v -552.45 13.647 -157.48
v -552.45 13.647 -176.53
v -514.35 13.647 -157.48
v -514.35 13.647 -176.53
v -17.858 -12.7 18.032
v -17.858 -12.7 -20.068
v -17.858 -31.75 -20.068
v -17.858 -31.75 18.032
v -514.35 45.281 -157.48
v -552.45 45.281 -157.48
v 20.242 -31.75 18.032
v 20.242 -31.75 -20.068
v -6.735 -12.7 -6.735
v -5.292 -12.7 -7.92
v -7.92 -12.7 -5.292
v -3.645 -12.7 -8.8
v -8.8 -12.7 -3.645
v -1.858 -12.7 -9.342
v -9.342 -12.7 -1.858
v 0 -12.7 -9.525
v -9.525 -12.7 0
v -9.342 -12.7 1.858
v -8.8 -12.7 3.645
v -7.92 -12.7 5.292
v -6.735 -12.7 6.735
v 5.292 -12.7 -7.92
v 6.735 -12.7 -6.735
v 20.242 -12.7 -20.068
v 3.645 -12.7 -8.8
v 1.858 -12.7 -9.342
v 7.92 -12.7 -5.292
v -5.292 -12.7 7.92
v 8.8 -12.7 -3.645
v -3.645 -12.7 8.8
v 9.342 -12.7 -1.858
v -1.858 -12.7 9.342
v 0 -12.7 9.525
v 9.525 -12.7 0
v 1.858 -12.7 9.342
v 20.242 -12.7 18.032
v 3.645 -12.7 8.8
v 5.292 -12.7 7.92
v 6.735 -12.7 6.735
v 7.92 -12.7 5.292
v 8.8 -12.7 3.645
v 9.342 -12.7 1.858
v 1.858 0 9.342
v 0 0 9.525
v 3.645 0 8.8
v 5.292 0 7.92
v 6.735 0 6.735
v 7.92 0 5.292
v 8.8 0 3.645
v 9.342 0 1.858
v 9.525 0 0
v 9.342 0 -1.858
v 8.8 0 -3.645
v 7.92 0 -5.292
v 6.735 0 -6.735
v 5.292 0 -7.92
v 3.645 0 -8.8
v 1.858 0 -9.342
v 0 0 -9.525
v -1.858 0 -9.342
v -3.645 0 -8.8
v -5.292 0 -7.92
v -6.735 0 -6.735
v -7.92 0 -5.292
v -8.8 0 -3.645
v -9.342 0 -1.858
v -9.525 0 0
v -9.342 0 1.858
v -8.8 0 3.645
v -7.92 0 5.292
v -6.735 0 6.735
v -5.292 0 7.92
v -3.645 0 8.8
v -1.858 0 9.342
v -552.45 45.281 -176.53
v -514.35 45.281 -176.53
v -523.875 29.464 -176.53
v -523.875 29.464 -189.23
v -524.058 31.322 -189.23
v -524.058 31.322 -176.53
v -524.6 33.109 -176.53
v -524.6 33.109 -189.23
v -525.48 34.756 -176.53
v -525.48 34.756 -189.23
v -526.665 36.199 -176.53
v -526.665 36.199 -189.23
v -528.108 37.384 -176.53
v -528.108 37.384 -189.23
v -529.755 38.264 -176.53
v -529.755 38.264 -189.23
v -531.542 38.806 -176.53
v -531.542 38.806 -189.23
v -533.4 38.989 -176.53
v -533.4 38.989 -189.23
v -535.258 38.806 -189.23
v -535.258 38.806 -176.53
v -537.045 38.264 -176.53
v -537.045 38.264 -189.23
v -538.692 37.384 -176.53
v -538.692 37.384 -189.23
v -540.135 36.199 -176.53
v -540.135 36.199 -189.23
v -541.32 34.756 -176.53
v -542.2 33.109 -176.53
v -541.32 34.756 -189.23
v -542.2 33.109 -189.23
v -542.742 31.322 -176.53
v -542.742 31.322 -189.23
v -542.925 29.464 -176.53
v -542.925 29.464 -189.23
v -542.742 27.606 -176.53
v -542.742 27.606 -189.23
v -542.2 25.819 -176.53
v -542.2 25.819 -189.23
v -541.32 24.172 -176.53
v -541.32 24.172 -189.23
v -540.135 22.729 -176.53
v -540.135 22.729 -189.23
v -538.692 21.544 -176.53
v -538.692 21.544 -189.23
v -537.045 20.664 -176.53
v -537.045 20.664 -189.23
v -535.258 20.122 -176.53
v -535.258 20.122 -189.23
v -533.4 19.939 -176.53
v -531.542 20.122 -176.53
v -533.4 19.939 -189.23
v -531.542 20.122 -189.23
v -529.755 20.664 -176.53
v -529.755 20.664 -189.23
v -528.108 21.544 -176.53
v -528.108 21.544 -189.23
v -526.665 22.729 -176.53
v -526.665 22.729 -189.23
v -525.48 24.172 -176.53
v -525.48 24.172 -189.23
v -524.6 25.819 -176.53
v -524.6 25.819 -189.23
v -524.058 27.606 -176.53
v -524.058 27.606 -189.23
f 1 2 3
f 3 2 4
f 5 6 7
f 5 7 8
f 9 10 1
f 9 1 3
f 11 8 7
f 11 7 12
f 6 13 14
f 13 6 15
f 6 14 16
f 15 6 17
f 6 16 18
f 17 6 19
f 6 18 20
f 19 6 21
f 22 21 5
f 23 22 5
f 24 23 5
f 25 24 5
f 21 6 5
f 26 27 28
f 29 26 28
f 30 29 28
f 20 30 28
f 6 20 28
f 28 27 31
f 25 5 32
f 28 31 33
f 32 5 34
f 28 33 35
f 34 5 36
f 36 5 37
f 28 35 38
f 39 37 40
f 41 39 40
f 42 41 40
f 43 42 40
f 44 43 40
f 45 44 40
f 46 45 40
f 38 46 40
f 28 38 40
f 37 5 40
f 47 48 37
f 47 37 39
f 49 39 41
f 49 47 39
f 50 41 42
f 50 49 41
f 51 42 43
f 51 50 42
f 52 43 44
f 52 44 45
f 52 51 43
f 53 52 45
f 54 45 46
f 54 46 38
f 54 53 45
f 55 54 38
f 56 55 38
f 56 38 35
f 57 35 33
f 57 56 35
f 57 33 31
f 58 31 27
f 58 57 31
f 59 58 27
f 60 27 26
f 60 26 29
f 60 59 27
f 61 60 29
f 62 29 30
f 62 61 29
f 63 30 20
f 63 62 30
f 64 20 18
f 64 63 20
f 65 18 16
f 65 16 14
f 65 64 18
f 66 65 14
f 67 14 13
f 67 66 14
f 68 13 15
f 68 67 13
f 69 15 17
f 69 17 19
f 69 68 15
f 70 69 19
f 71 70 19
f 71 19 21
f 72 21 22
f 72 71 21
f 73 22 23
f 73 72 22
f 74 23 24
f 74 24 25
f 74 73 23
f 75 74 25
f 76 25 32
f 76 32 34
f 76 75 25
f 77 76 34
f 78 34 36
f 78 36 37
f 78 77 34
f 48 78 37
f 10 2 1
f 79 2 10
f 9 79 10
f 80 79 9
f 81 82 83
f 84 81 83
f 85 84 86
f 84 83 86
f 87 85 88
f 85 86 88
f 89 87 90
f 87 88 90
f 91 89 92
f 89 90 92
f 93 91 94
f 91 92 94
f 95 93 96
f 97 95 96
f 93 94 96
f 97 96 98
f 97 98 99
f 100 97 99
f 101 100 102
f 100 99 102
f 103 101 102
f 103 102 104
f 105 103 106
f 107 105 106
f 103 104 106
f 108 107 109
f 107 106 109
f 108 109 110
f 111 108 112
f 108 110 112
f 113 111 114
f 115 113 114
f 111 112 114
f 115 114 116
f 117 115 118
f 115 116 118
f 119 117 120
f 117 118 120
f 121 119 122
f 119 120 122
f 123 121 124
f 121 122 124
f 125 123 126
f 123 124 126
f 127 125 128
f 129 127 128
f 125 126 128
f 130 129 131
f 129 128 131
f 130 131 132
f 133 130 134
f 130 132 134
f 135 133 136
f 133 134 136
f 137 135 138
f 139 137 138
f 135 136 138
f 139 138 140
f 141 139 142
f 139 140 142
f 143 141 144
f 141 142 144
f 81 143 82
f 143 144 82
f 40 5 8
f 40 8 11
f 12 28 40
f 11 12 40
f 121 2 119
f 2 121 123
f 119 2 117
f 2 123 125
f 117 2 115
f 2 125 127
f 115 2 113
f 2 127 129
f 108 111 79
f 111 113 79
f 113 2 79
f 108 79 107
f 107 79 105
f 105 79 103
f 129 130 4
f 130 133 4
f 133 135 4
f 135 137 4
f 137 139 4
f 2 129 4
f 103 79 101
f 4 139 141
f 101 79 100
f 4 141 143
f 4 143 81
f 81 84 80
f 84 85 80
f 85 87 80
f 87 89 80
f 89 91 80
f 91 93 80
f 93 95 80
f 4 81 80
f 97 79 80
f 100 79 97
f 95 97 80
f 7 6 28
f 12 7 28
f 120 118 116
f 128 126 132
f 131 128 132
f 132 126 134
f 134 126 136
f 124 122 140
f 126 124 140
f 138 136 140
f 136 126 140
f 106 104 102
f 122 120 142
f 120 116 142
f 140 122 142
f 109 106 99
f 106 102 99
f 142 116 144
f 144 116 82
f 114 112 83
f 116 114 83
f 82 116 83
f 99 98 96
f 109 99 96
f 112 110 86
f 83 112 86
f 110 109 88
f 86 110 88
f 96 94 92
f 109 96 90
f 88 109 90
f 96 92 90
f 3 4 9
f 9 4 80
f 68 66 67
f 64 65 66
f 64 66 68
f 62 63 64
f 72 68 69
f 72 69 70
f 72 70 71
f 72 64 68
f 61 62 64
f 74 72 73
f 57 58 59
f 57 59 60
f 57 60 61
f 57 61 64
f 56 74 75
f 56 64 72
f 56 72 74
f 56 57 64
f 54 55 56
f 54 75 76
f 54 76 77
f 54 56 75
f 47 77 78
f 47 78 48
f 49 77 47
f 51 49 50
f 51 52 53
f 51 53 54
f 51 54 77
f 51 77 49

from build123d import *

# Parameters (mm, degrees)
SKETCH1_R      = 9.525
EXTRUDE1_DEPTH = 12.7
SKETCH2_W      = 38.1
SKETCH2_H      = 38.1
EXTRUDE2_DEPTH = 19.05
SKETCH3_R      = 9.525
EXTRUDE3_DEPTH = 12.7
SKETCH4_W      = 38.1
SKETCH4_H      = 31.634756462
EXTRUDE4_DEPTH = 19.05


with BuildPart() as part:
    # Sketch1 → Extrude1 (new body)
    with BuildSketch(Plane(origin=(0, 0, 0), x_dir=(1, 0, 0), z_dir=(0, 1, 0))):
        with Locations(Location((0, 0, 0), (0, 0, 270))):
            Circle(SKETCH1_R)
    extrude(amount=-EXTRUDE1_DEPTH)

    # Sketch2 → Extrude2 (add)
    with BuildSketch(Plane.XZ.offset(12.7)):
        with Locations((1.191835115, -1.018196851)):
            Rectangle(SKETCH2_W, SKETCH2_H)
    extrude(amount=EXTRUDE2_DEPTH)


with BuildPart() as body_2:
    # Sketch3 → Extrude3 (new body)
    with BuildSketch(Plane.XY.offset(-189.23)):
        with Locations((-533.4, 29.464)):
            Circle(SKETCH3_R)
    extrude(amount=EXTRUDE3_DEPTH)

    # Sketch4 → Extrude4 (add)
    with BuildSketch(Plane.XY.offset(-176.53)):
        with Locations((-533.4, 29.464)):
            Rectangle(SKETCH4_W, SKETCH4_H)
    extrude(amount=EXTRUDE4_DEPTH)


solid = Compound([part.part, body_2.part])
